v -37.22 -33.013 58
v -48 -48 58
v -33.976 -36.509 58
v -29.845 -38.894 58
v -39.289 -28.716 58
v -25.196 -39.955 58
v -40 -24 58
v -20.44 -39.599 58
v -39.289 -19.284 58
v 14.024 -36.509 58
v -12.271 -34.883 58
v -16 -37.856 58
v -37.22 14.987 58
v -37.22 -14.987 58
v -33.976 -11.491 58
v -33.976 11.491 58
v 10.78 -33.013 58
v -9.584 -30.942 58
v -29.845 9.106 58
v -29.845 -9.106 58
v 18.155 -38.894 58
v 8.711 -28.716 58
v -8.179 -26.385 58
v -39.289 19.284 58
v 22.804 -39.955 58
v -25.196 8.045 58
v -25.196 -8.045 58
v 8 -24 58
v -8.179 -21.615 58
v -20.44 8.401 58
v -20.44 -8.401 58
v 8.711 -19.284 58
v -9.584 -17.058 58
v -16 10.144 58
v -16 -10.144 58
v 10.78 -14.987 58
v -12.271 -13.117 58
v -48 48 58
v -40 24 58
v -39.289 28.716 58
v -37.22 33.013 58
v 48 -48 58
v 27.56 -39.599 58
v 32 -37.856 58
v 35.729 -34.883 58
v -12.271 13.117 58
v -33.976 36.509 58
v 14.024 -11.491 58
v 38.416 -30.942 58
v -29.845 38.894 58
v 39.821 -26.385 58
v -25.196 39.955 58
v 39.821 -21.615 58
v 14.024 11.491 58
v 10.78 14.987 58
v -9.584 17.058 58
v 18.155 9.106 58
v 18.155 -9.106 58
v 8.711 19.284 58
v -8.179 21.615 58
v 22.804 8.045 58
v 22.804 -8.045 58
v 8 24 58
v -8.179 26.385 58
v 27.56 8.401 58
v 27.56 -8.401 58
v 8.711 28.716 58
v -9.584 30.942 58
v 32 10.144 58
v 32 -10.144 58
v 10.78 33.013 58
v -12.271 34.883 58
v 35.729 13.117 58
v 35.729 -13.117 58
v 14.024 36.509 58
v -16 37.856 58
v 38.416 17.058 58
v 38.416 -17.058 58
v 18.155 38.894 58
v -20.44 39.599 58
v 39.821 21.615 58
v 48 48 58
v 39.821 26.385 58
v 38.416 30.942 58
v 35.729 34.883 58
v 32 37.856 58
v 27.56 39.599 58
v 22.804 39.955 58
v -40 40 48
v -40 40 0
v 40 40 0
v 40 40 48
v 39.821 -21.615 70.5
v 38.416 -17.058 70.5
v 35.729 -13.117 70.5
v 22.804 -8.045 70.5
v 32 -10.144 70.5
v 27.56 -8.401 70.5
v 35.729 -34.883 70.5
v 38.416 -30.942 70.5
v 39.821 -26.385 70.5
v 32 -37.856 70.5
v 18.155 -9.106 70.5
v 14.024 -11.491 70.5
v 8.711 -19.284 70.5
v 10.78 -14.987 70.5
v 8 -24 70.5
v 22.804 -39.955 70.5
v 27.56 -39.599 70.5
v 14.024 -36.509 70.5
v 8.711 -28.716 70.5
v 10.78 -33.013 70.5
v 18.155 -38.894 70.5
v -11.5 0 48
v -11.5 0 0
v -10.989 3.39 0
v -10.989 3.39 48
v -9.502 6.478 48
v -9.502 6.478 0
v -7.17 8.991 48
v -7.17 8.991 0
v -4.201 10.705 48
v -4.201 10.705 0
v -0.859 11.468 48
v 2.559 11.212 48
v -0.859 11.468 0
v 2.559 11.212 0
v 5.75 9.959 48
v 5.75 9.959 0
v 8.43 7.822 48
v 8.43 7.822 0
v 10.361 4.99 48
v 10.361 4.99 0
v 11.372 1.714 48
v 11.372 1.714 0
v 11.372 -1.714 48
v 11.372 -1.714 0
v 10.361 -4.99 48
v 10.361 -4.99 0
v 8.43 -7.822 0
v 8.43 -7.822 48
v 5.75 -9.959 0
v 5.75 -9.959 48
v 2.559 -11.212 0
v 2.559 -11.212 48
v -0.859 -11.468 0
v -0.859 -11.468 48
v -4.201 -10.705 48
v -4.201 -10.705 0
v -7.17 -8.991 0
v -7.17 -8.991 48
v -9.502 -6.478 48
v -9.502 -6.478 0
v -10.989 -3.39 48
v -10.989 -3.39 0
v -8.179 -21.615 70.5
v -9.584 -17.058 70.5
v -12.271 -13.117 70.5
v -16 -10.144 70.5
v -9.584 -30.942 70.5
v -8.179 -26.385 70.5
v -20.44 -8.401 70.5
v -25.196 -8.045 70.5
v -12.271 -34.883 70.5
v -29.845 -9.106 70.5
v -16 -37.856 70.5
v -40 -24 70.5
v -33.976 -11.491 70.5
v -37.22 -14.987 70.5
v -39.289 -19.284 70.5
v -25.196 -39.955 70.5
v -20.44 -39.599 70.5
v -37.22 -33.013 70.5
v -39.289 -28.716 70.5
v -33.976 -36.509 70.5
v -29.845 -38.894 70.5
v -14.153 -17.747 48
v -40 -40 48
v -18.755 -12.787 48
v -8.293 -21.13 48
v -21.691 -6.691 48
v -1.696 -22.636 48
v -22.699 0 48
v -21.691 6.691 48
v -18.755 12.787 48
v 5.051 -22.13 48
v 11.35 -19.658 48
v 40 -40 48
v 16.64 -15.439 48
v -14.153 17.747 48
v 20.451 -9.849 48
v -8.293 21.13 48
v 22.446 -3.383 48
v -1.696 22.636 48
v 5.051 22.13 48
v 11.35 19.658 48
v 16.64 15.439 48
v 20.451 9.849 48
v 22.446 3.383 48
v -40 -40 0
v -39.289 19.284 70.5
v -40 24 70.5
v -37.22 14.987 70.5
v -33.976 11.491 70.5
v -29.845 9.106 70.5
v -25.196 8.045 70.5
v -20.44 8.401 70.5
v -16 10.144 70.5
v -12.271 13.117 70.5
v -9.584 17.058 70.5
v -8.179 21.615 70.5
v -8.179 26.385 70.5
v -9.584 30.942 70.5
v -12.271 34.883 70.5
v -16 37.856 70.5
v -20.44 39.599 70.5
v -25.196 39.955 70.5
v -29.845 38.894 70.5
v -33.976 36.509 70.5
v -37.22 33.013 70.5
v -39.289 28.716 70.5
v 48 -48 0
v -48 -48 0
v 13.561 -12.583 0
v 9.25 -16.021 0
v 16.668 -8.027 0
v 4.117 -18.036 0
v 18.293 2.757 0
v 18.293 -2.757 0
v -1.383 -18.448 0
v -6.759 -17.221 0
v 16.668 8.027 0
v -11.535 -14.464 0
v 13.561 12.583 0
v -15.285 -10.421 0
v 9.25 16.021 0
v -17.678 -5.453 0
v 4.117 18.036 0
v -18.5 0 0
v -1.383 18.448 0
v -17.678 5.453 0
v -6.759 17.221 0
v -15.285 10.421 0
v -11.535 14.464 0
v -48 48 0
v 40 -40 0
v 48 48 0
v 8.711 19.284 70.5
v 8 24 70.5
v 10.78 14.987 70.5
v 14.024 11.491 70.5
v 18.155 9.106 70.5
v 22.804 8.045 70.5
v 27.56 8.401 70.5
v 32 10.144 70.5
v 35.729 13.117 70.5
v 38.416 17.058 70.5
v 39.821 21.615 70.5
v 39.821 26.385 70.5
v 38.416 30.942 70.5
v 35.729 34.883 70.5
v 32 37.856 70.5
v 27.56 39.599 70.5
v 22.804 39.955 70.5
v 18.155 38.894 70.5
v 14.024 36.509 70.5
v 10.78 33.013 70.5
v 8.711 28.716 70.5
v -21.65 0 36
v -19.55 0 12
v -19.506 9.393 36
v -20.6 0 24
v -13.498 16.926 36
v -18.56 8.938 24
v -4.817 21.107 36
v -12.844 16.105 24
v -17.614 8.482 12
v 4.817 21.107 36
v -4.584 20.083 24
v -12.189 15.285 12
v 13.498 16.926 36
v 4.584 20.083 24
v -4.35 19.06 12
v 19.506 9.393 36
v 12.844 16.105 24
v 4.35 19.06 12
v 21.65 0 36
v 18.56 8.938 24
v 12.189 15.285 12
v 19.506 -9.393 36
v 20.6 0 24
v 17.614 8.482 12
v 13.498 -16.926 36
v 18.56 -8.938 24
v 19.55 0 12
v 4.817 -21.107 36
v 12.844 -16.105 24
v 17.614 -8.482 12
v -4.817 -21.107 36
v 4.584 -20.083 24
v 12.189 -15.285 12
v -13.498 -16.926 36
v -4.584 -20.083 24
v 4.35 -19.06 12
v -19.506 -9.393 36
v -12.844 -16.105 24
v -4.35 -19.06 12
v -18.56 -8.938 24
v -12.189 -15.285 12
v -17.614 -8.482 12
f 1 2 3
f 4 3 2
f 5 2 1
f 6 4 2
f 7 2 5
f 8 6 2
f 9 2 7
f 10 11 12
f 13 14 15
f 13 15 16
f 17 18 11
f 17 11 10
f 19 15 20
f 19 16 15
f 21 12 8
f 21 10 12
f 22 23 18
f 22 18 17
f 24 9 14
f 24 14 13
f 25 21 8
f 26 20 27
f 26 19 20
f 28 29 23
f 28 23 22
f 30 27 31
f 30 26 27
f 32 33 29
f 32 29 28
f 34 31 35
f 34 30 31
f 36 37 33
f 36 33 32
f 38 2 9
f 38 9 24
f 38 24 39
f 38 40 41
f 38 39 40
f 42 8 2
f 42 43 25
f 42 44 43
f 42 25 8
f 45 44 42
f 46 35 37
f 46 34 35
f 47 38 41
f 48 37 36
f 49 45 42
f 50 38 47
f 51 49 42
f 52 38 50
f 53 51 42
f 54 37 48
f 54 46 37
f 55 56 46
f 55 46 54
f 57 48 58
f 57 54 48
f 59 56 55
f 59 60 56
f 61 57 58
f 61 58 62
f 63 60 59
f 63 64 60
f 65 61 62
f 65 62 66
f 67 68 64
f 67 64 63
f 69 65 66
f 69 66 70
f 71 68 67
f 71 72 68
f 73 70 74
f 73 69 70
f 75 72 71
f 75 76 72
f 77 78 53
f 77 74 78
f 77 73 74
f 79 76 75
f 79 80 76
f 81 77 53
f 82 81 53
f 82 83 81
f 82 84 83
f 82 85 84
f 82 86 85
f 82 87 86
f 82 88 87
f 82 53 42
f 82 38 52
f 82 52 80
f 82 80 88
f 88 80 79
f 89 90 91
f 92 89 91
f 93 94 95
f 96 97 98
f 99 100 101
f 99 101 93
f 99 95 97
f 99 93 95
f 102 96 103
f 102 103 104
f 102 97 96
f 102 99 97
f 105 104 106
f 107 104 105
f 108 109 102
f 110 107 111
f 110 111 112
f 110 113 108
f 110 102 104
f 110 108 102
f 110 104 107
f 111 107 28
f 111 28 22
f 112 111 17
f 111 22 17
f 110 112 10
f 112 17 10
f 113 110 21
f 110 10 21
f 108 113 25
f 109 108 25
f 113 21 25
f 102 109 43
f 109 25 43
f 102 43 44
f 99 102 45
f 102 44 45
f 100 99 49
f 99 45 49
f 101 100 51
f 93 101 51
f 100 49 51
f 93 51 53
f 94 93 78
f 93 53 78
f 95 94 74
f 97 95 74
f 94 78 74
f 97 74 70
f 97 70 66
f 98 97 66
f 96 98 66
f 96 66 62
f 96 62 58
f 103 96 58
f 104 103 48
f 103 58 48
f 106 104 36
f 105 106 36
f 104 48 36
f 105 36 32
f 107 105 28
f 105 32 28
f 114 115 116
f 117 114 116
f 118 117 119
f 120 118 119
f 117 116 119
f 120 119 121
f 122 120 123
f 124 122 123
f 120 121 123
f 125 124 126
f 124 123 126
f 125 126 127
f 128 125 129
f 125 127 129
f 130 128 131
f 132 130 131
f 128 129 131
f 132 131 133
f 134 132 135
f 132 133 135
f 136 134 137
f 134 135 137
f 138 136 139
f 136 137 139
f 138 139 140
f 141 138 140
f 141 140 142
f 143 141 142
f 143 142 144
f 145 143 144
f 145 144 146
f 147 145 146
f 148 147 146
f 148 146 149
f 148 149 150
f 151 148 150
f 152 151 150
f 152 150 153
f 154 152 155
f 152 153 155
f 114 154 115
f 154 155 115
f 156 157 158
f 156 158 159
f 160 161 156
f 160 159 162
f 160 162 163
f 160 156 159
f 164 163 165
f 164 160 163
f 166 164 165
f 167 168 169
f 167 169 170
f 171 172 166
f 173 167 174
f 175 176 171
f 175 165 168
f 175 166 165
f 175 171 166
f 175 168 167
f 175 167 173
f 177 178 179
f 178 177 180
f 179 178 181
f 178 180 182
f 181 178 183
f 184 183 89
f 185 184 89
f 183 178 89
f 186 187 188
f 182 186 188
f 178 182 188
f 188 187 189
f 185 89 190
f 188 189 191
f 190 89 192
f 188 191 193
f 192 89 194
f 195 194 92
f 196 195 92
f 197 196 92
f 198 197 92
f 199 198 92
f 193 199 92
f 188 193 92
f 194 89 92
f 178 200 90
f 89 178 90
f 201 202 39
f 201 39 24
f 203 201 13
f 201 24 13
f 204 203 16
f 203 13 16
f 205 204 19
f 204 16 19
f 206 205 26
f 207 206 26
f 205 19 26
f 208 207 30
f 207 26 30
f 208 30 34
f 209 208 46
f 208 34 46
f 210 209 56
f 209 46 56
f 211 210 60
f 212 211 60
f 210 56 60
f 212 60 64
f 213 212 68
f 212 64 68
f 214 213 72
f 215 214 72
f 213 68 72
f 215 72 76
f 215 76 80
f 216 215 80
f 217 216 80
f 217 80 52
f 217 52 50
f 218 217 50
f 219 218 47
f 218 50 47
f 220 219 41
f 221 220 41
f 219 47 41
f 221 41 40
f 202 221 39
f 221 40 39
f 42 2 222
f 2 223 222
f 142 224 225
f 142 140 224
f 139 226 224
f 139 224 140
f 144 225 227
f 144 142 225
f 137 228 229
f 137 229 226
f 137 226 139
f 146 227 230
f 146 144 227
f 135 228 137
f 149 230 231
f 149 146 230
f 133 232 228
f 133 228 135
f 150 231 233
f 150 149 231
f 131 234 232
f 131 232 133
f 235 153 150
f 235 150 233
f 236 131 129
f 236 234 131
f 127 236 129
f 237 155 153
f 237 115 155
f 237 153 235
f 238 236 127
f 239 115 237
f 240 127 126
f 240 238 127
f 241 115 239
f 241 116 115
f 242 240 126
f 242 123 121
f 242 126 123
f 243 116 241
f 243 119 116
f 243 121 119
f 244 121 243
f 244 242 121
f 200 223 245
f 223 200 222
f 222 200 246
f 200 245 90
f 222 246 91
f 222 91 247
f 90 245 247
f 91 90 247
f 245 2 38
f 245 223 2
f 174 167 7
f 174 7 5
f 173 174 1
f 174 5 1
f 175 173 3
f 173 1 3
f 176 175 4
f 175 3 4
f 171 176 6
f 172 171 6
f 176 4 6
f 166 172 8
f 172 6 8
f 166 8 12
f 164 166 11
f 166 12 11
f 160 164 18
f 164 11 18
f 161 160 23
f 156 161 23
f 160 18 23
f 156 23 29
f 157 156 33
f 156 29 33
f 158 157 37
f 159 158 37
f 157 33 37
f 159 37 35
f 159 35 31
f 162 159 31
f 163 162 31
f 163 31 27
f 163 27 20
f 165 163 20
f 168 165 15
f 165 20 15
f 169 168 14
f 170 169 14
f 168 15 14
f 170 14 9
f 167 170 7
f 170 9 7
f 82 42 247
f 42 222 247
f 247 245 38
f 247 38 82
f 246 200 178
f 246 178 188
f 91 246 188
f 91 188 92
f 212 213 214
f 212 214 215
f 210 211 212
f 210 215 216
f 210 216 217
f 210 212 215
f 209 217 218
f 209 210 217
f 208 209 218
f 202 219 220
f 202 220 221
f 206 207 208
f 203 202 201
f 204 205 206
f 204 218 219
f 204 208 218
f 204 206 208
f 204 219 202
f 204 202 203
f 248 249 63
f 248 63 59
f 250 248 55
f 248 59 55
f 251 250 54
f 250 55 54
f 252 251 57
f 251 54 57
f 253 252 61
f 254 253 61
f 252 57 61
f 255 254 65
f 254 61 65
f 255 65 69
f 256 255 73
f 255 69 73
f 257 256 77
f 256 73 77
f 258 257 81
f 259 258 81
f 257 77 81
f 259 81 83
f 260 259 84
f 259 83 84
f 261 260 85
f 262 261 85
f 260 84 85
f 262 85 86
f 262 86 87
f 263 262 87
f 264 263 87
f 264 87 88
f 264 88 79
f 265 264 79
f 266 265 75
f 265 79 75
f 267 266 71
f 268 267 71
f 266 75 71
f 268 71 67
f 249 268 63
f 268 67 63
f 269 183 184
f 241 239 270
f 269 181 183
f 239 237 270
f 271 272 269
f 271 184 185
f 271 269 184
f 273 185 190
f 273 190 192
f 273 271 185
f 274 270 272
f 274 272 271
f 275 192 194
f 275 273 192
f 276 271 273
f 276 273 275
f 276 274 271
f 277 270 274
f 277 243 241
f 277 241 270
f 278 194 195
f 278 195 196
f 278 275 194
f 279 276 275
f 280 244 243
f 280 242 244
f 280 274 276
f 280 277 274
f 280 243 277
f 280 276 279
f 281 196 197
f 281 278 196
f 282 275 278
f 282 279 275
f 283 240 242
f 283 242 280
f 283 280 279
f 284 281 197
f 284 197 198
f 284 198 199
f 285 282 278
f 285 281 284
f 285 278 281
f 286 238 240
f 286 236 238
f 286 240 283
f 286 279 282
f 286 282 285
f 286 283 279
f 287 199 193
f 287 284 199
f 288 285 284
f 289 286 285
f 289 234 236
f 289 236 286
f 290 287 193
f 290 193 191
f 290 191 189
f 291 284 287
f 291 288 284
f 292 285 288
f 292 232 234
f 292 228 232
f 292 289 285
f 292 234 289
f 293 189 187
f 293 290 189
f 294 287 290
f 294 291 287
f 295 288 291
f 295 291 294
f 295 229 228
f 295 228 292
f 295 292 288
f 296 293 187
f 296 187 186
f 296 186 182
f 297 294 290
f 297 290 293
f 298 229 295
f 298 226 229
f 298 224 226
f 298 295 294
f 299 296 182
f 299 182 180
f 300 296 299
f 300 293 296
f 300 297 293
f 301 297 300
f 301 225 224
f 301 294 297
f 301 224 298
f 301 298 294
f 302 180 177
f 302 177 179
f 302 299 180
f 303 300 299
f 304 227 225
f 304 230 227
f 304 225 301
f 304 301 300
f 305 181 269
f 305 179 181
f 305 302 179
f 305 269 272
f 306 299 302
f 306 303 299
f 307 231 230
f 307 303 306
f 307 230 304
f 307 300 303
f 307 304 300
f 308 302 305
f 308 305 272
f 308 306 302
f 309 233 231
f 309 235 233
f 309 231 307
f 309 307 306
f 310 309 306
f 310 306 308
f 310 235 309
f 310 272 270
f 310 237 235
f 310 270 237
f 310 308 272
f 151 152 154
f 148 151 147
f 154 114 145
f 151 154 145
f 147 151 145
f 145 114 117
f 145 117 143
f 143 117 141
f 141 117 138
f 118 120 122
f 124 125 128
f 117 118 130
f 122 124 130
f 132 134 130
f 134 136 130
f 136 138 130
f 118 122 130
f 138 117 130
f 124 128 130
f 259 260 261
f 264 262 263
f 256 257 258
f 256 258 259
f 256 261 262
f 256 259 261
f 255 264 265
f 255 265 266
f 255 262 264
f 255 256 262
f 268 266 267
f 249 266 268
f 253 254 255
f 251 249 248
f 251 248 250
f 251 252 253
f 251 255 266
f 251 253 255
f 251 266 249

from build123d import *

# Parameters (mm, degrees)
ESQUISSE1_W        = 96
ESQUISSE1_H        = 96
ESQUISSE1_W_2      = 80
ESQUISSE1_H_2      = 80
BOSS_EXTRU_1_DEPTH = 48
ESQUISSE2_W        = 96
ESQUISSE2_H        = 96
BOSS_EXTRU_3_DEPTH = 10
ESQUISSE3_R        = 16
BOSS_EXTRU_4_DEPTH = 12.5
ESQUISSE4_R        = 18.5
ESQUISSE4_R_2      = 11.5
BOSS_EXTRU_5_DEPTH = 48
CHANFREIN1_SIZE2   = 48
CHANFREIN1_SIZE    = 4.199455849


with BuildPart() as part:
    # Esquisse1 → Boss.-Extru.1 (new body)
    with BuildSketch(Plane.XY):
        Rectangle(ESQUISSE1_W, ESQUISSE1_H)
        Rectangle(ESQUISSE1_W_2, ESQUISSE1_H_2, mode=Mode.SUBTRACT)
    extrude(amount=BOSS_EXTRU_1_DEPTH)

    # Esquisse2 → Boss.-Extru.3 (add)
    with BuildSketch(Plane.XY.offset(48)):
        Rectangle(ESQUISSE2_W, ESQUISSE2_H)
    extrude(amount=BOSS_EXTRU_3_DEPTH)

    # Esquisse3 → Boss.-Extru.4 (add)
    with BuildSketch(Plane.XY.offset(58)):
        with Locations(Location((-24, 24, 0), (0, 0, 180))):
            Circle(ESQUISSE3_R)
        with Locations(Location((24, 24, 0), (0, 0, 180))):
            Circle(ESQUISSE3_R)
        with Locations(Location((24, -24, 0), (0, 0, 180))):
            Circle(ESQUISSE3_R)
        with Locations(Location((-24, -24, 0), (0, 0, 180))):
            Circle(ESQUISSE3_R)
    extrude(amount=BOSS_EXTRU_4_DEPTH)

    # Esquisse4 → Boss.-Extru.5 (add)
    with BuildSketch(Plane(origin=(0, 0, 0), x_dir=(-1, 0, 0), z_dir=(0, 0, -1))):
        Circle(ESQUISSE4_R)
        Circle(ESQUISSE4_R_2, mode=Mode.SUBTRACT)
    extrude(amount=-BOSS_EXTRU_5_DEPTH)

    # Chanfrein1
    chanfrein1_edges = [part.edges().sort_by_distance(p)[0] for p in [
        (18.5, 0, 48),
    ]]
    chanfrein1_side = [part.faces().sort_by_distance(p)[0] for p in [
        (18.583989117, 0, 48),
    ]]
    chamfer(chanfrein1_edges, length=CHANFREIN1_SIZE - 0.0001, length2=CHANFREIN1_SIZE2 - 0.0001, reference=chanfrein1_side[0])  # a hair under: the kernel refuses the full size


solid = part.part
